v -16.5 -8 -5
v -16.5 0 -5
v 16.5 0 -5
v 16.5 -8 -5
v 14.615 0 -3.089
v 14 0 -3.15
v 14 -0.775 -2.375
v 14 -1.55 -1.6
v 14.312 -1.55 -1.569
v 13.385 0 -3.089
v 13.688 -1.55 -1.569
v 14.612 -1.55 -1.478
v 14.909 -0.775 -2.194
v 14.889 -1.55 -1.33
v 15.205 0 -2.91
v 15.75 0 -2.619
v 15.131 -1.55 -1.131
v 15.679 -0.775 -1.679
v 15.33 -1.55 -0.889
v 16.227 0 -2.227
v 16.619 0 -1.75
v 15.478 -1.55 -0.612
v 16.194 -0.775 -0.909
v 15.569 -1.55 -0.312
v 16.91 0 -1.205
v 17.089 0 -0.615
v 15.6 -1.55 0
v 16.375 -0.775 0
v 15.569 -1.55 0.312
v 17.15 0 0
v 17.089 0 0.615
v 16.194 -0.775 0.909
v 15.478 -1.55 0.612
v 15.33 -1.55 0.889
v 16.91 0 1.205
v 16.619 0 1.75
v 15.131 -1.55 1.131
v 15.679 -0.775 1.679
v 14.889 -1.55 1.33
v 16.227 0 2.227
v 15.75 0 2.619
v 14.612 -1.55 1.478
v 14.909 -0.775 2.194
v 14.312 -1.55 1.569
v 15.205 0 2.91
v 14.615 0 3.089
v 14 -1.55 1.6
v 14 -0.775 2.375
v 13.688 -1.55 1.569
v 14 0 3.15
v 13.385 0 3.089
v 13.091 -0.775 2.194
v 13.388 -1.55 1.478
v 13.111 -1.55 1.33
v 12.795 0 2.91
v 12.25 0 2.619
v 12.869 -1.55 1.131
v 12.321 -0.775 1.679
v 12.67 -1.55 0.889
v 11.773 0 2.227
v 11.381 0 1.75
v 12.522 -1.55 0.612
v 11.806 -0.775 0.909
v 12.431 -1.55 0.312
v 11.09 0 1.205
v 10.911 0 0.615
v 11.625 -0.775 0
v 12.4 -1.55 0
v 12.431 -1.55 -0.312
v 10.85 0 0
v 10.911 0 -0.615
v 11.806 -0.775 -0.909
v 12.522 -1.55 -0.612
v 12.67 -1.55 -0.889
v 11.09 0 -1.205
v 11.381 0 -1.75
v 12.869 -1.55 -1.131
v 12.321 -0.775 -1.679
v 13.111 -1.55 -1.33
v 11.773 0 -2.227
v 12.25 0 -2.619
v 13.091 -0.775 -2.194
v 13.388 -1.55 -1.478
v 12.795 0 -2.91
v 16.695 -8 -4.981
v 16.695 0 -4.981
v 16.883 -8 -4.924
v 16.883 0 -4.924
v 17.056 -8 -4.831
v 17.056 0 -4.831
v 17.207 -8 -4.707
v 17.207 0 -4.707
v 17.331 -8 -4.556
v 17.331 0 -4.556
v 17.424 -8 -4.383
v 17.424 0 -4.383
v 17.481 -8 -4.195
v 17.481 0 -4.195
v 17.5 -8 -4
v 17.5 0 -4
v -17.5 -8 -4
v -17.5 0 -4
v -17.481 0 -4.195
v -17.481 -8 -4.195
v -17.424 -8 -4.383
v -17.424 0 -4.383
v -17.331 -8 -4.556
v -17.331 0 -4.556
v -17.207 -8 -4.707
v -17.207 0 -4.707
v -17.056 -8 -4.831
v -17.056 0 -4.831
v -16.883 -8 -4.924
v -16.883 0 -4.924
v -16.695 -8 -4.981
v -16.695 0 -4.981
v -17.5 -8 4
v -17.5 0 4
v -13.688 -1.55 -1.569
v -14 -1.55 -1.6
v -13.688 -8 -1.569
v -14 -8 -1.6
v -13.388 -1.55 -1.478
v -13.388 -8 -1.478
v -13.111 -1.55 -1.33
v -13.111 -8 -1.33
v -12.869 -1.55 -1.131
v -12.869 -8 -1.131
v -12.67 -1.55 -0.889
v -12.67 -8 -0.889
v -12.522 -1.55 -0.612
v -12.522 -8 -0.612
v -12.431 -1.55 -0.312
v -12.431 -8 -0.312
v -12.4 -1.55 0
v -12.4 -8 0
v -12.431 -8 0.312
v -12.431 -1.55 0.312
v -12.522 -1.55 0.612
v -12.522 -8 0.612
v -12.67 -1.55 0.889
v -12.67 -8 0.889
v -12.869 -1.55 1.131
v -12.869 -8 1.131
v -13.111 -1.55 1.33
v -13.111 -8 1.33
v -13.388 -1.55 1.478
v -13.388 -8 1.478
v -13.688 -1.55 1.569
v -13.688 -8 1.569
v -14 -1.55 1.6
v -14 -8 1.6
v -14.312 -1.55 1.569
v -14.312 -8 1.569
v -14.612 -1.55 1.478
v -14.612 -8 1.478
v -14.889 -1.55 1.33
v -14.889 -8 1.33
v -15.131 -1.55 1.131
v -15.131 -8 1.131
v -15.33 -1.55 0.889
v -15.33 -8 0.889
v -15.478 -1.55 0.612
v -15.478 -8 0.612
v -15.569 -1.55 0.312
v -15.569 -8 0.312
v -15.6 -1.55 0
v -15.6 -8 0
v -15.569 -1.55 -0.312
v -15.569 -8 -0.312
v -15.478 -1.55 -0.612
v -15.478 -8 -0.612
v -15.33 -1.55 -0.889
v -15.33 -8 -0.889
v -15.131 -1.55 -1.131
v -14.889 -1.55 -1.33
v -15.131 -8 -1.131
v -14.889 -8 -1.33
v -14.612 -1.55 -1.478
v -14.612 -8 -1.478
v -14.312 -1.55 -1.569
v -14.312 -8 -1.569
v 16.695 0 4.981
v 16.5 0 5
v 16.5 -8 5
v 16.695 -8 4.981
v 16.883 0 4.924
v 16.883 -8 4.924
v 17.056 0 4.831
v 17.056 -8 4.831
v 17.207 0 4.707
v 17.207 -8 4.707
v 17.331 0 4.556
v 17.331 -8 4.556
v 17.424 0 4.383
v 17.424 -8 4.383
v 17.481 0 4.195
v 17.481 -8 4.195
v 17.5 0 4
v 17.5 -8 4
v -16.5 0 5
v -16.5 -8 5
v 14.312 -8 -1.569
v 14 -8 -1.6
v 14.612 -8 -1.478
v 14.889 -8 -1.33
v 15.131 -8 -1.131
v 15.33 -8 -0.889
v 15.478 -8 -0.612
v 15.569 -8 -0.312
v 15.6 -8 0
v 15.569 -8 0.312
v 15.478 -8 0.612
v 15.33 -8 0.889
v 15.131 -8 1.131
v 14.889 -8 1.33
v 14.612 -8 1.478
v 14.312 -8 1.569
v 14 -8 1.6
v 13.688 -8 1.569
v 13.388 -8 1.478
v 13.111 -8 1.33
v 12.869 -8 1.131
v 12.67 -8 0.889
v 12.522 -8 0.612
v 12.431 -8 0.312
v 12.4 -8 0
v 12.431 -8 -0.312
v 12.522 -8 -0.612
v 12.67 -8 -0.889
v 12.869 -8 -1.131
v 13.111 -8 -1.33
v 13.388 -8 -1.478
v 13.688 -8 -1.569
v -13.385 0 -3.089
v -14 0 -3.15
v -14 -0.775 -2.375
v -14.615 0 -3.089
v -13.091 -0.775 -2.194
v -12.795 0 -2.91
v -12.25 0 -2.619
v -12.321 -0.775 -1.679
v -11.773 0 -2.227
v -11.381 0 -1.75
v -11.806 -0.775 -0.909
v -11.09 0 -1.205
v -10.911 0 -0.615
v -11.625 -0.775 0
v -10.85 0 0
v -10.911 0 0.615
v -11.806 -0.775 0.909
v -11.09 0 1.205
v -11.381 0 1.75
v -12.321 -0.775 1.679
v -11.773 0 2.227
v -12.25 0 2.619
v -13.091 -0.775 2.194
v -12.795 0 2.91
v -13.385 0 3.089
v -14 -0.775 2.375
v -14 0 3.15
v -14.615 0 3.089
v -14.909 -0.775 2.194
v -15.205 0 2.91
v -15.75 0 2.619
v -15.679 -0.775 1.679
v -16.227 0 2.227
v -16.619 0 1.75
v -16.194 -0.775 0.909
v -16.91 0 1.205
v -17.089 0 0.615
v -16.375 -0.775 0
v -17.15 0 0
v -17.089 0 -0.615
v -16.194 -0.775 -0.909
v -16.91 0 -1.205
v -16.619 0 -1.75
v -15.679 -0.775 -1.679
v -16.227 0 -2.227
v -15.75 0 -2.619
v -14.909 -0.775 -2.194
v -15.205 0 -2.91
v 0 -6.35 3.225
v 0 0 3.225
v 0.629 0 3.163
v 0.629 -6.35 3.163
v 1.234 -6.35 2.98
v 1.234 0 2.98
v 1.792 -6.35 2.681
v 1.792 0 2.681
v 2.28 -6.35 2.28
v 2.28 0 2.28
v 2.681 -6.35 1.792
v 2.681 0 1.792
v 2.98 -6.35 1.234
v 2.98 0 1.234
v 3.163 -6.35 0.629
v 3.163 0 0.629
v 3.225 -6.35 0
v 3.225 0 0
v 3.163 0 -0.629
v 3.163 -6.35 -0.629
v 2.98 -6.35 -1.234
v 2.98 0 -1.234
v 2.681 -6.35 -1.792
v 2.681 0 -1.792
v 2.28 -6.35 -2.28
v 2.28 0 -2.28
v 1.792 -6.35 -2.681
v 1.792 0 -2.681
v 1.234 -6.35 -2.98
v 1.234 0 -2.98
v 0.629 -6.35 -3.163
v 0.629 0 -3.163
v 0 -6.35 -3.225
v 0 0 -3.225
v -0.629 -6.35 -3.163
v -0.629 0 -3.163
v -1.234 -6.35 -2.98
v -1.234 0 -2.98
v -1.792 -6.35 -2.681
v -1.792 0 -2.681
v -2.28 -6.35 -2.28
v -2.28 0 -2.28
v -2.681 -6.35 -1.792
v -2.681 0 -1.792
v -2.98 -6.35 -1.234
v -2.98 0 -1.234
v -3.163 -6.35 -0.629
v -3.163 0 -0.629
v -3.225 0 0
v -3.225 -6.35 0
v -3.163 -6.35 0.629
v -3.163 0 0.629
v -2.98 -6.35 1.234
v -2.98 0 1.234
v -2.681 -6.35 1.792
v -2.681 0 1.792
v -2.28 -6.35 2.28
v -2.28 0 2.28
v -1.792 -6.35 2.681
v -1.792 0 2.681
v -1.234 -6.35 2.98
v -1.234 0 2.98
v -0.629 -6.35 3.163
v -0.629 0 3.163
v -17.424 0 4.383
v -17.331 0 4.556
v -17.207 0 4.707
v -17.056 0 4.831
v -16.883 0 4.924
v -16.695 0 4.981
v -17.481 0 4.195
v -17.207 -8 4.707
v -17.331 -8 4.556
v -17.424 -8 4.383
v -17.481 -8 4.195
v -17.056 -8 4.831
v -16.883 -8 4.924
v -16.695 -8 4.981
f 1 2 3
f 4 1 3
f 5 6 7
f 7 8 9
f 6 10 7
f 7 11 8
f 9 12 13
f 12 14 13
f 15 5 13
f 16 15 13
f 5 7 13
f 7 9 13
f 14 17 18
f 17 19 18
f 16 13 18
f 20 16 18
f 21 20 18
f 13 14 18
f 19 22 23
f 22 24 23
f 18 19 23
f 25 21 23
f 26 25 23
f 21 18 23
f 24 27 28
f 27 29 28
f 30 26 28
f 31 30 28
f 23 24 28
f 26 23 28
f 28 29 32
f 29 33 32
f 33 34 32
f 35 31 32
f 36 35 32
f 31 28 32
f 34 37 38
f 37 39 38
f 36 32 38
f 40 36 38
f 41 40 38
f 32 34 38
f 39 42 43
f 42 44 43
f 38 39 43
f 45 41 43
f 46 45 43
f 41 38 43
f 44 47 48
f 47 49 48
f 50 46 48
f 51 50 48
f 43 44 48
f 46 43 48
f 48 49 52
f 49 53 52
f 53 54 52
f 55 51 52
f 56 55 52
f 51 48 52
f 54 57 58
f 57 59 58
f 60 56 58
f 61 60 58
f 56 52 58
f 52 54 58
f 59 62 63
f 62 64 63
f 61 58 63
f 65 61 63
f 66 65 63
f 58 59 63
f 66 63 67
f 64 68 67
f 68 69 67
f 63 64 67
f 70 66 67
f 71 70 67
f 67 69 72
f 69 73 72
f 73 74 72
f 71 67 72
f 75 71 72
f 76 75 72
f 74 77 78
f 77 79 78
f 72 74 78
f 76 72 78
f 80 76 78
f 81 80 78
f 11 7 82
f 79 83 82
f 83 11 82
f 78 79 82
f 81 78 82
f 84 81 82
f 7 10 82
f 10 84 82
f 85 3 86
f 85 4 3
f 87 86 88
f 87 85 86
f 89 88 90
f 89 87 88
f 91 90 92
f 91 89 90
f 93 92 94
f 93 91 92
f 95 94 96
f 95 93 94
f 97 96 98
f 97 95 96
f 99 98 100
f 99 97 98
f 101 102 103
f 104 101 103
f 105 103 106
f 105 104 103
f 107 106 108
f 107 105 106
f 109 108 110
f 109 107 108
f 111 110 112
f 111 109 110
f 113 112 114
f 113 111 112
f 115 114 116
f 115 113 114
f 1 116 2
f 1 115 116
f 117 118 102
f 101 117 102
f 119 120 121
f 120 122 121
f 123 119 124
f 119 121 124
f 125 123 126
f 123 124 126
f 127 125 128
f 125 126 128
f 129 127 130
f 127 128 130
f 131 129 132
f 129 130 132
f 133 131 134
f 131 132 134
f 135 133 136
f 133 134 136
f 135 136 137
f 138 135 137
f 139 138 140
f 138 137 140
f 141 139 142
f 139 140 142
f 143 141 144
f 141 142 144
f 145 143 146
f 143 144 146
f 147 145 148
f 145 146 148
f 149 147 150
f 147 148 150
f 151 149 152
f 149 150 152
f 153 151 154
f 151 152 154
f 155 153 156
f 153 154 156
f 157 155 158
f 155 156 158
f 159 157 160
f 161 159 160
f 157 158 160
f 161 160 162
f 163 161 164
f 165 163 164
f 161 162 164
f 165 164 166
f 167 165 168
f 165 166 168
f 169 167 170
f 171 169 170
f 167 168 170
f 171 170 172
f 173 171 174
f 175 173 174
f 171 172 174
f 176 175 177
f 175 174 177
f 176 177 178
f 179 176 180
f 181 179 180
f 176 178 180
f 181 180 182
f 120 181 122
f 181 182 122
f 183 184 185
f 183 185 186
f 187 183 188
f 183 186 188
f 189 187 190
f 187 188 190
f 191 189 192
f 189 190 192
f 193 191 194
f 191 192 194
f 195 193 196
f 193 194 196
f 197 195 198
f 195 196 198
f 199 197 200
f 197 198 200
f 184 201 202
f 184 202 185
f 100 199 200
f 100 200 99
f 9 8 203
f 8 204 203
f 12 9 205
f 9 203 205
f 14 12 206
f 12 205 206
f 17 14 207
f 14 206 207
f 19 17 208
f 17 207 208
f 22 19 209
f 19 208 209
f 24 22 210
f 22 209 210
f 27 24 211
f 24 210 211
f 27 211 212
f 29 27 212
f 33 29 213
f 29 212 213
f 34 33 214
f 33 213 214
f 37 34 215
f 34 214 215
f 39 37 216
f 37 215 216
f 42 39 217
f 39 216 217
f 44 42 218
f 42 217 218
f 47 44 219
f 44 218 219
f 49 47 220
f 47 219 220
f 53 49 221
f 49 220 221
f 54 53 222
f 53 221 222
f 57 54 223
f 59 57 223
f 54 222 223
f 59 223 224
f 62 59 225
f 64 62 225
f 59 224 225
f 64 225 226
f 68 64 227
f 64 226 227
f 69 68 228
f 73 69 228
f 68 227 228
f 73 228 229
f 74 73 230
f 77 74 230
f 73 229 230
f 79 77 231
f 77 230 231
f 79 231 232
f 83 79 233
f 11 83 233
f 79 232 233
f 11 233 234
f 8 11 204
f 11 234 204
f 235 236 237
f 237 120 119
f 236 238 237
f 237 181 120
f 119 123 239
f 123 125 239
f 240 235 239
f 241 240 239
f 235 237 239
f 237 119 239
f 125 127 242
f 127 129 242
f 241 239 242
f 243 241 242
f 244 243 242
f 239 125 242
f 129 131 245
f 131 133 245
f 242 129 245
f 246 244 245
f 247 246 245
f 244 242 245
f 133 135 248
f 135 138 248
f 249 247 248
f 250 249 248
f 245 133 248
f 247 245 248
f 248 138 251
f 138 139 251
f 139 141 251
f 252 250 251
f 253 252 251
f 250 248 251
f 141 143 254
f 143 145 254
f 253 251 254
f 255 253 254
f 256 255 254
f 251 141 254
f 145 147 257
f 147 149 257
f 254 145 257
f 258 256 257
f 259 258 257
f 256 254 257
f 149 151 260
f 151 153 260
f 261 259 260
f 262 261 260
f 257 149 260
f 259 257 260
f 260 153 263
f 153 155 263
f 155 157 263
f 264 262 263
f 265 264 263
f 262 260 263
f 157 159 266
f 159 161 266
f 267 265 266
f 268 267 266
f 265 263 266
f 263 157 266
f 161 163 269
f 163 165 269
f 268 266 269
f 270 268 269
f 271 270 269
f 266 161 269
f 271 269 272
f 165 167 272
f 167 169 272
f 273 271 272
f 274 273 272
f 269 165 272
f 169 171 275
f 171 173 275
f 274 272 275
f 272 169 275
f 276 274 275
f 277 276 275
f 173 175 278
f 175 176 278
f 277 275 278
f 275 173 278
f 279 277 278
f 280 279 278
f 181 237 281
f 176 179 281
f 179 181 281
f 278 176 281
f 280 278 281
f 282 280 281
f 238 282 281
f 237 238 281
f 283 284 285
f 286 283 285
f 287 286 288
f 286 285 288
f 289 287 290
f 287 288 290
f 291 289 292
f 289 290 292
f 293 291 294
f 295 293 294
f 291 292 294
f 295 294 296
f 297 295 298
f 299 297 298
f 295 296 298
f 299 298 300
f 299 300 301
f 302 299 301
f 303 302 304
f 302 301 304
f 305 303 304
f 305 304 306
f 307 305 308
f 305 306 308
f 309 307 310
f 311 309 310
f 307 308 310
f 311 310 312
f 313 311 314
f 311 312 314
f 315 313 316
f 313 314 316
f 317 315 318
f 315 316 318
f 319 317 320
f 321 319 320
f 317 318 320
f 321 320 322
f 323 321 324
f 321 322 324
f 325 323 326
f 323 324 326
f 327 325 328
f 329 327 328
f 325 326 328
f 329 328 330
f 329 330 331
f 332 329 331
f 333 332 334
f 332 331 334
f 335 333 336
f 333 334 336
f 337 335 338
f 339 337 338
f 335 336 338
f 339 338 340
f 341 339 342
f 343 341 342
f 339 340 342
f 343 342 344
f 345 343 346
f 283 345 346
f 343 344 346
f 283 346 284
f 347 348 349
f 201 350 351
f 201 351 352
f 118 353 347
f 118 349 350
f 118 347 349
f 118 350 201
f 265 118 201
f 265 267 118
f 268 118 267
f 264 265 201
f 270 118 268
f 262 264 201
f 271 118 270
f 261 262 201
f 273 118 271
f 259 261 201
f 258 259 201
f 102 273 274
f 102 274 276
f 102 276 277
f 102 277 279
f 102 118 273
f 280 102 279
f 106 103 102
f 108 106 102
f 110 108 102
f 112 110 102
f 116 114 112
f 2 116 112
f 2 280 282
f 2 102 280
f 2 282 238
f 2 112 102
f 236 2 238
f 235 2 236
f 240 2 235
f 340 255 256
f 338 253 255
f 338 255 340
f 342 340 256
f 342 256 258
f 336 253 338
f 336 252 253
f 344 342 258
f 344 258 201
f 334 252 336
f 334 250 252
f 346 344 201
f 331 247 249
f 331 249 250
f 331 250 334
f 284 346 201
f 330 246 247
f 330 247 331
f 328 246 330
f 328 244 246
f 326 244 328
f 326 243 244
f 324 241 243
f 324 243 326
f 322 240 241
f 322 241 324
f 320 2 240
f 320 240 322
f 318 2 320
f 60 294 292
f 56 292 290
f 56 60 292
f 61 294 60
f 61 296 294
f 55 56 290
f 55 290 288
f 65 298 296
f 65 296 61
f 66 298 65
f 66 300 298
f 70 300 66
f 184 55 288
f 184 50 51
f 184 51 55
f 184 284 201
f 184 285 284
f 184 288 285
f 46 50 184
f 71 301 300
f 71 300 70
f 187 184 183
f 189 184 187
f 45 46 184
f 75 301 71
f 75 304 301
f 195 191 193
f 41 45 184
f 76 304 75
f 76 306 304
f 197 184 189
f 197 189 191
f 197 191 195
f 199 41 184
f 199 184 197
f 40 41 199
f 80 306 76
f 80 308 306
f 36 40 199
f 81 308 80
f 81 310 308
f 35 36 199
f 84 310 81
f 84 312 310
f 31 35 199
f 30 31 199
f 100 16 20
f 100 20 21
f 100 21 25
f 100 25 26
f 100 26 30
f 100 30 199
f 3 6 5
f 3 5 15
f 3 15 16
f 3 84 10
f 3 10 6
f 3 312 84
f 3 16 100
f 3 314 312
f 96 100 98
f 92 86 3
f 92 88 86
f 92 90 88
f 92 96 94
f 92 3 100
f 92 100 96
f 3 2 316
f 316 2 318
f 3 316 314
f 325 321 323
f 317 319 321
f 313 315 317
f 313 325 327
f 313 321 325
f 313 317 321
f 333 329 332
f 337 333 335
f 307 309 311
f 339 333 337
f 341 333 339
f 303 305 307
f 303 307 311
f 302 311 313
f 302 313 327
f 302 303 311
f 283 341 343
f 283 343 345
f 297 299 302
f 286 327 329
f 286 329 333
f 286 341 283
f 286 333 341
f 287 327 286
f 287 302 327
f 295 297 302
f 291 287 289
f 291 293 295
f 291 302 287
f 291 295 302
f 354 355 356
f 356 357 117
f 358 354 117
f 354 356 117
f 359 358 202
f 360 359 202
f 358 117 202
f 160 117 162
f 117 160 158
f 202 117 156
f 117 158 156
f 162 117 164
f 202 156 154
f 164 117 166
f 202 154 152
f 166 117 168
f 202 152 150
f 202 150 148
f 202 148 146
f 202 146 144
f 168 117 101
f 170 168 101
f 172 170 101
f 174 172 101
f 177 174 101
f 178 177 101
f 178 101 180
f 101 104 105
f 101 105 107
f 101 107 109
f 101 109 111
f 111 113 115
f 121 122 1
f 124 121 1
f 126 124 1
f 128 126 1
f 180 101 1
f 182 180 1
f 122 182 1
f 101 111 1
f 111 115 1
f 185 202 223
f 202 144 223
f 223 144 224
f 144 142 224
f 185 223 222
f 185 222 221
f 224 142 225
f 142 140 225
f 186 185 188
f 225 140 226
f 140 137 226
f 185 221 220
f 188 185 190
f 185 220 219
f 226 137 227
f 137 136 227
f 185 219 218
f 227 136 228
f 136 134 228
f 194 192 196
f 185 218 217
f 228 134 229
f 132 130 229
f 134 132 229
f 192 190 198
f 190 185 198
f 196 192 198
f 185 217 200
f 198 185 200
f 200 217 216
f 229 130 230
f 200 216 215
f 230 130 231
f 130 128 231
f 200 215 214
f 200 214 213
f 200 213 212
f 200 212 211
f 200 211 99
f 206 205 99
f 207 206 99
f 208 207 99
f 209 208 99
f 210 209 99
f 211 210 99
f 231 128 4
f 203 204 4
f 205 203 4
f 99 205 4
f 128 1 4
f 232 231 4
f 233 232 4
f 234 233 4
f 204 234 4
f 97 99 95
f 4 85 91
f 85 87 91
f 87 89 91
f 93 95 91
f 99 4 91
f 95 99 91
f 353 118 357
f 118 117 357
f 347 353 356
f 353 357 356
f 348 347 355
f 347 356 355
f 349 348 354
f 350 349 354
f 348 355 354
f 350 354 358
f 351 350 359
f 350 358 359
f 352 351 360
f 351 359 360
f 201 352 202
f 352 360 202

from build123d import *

# Parameters (mm, degrees)
SKETCH1_W                                       = 35
SKETCH1_H                                       = 10
BOSS_EXTRUDE1_DEPTH                             = 8
CSK_FOR_M3_FLAT_HEAD_MACHINE_SCREW1_D           = 3.2
CSK_FOR_M3_FLAT_HEAD_MACHINE_SCREW1_CSINK_D     = 6.3
CSK_FOR_M3_FLAT_HEAD_MACHINE_SCREW1_CSINK_ANGLE = 90
SKETCH1_3_R                                     = 3.225
CUT_EXTRUDE2_DEPTH                              = 6.35
FILLET1_R                                       = 1


with BuildPart() as part:
    # Sketch1 → Boss-Extrude1 (new body)
    with BuildSketch(Plane(origin=(0, 0, 0), x_dir=(1, 0, 0), z_dir=(0, 1, 0))):
        Rectangle(SKETCH1_W, SKETCH1_H)
    extrude(amount=-BOSS_EXTRUDE1_DEPTH)

    # CSK for M3 Flat Head Machine Screw1 (through all)
    with Locations(Plane(origin=(-14, 0, 0), x_dir=(0, 0, 1), z_dir=(0, 1, 0))):
        with Locations((0, 0), (0, 28)):
            CounterSinkHole(CSK_FOR_M3_FLAT_HEAD_MACHINE_SCREW1_D / 2, CSK_FOR_M3_FLAT_HEAD_MACHINE_SCREW1_CSINK_D / 2, counter_sink_angle=CSK_FOR_M3_FLAT_HEAD_MACHINE_SCREW1_CSINK_ANGLE)

    # Sketch1<3> → Cut-Extrude2 (cut)
    with BuildSketch(Plane(origin=(0, 0, 0), x_dir=(1, 0, 0), z_dir=(0, 1, 0))):
        Circle(SKETCH1_3_R)
    extrude(amount=-CUT_EXTRUDE2_DEPTH, mode=Mode.SUBTRACT)

    # Fillet1
    fillet1_edges = [part.edges().sort_by_distance(p)[0] for p in [
        (17.5, -4, -5),
        (17.5, -4, 5),
        (-17.5, -4, -5),
        (-17.5, -4, 5),
    ]]
    fillet(fillet1_edges, radius=FILLET1_R)


solid = part.part
